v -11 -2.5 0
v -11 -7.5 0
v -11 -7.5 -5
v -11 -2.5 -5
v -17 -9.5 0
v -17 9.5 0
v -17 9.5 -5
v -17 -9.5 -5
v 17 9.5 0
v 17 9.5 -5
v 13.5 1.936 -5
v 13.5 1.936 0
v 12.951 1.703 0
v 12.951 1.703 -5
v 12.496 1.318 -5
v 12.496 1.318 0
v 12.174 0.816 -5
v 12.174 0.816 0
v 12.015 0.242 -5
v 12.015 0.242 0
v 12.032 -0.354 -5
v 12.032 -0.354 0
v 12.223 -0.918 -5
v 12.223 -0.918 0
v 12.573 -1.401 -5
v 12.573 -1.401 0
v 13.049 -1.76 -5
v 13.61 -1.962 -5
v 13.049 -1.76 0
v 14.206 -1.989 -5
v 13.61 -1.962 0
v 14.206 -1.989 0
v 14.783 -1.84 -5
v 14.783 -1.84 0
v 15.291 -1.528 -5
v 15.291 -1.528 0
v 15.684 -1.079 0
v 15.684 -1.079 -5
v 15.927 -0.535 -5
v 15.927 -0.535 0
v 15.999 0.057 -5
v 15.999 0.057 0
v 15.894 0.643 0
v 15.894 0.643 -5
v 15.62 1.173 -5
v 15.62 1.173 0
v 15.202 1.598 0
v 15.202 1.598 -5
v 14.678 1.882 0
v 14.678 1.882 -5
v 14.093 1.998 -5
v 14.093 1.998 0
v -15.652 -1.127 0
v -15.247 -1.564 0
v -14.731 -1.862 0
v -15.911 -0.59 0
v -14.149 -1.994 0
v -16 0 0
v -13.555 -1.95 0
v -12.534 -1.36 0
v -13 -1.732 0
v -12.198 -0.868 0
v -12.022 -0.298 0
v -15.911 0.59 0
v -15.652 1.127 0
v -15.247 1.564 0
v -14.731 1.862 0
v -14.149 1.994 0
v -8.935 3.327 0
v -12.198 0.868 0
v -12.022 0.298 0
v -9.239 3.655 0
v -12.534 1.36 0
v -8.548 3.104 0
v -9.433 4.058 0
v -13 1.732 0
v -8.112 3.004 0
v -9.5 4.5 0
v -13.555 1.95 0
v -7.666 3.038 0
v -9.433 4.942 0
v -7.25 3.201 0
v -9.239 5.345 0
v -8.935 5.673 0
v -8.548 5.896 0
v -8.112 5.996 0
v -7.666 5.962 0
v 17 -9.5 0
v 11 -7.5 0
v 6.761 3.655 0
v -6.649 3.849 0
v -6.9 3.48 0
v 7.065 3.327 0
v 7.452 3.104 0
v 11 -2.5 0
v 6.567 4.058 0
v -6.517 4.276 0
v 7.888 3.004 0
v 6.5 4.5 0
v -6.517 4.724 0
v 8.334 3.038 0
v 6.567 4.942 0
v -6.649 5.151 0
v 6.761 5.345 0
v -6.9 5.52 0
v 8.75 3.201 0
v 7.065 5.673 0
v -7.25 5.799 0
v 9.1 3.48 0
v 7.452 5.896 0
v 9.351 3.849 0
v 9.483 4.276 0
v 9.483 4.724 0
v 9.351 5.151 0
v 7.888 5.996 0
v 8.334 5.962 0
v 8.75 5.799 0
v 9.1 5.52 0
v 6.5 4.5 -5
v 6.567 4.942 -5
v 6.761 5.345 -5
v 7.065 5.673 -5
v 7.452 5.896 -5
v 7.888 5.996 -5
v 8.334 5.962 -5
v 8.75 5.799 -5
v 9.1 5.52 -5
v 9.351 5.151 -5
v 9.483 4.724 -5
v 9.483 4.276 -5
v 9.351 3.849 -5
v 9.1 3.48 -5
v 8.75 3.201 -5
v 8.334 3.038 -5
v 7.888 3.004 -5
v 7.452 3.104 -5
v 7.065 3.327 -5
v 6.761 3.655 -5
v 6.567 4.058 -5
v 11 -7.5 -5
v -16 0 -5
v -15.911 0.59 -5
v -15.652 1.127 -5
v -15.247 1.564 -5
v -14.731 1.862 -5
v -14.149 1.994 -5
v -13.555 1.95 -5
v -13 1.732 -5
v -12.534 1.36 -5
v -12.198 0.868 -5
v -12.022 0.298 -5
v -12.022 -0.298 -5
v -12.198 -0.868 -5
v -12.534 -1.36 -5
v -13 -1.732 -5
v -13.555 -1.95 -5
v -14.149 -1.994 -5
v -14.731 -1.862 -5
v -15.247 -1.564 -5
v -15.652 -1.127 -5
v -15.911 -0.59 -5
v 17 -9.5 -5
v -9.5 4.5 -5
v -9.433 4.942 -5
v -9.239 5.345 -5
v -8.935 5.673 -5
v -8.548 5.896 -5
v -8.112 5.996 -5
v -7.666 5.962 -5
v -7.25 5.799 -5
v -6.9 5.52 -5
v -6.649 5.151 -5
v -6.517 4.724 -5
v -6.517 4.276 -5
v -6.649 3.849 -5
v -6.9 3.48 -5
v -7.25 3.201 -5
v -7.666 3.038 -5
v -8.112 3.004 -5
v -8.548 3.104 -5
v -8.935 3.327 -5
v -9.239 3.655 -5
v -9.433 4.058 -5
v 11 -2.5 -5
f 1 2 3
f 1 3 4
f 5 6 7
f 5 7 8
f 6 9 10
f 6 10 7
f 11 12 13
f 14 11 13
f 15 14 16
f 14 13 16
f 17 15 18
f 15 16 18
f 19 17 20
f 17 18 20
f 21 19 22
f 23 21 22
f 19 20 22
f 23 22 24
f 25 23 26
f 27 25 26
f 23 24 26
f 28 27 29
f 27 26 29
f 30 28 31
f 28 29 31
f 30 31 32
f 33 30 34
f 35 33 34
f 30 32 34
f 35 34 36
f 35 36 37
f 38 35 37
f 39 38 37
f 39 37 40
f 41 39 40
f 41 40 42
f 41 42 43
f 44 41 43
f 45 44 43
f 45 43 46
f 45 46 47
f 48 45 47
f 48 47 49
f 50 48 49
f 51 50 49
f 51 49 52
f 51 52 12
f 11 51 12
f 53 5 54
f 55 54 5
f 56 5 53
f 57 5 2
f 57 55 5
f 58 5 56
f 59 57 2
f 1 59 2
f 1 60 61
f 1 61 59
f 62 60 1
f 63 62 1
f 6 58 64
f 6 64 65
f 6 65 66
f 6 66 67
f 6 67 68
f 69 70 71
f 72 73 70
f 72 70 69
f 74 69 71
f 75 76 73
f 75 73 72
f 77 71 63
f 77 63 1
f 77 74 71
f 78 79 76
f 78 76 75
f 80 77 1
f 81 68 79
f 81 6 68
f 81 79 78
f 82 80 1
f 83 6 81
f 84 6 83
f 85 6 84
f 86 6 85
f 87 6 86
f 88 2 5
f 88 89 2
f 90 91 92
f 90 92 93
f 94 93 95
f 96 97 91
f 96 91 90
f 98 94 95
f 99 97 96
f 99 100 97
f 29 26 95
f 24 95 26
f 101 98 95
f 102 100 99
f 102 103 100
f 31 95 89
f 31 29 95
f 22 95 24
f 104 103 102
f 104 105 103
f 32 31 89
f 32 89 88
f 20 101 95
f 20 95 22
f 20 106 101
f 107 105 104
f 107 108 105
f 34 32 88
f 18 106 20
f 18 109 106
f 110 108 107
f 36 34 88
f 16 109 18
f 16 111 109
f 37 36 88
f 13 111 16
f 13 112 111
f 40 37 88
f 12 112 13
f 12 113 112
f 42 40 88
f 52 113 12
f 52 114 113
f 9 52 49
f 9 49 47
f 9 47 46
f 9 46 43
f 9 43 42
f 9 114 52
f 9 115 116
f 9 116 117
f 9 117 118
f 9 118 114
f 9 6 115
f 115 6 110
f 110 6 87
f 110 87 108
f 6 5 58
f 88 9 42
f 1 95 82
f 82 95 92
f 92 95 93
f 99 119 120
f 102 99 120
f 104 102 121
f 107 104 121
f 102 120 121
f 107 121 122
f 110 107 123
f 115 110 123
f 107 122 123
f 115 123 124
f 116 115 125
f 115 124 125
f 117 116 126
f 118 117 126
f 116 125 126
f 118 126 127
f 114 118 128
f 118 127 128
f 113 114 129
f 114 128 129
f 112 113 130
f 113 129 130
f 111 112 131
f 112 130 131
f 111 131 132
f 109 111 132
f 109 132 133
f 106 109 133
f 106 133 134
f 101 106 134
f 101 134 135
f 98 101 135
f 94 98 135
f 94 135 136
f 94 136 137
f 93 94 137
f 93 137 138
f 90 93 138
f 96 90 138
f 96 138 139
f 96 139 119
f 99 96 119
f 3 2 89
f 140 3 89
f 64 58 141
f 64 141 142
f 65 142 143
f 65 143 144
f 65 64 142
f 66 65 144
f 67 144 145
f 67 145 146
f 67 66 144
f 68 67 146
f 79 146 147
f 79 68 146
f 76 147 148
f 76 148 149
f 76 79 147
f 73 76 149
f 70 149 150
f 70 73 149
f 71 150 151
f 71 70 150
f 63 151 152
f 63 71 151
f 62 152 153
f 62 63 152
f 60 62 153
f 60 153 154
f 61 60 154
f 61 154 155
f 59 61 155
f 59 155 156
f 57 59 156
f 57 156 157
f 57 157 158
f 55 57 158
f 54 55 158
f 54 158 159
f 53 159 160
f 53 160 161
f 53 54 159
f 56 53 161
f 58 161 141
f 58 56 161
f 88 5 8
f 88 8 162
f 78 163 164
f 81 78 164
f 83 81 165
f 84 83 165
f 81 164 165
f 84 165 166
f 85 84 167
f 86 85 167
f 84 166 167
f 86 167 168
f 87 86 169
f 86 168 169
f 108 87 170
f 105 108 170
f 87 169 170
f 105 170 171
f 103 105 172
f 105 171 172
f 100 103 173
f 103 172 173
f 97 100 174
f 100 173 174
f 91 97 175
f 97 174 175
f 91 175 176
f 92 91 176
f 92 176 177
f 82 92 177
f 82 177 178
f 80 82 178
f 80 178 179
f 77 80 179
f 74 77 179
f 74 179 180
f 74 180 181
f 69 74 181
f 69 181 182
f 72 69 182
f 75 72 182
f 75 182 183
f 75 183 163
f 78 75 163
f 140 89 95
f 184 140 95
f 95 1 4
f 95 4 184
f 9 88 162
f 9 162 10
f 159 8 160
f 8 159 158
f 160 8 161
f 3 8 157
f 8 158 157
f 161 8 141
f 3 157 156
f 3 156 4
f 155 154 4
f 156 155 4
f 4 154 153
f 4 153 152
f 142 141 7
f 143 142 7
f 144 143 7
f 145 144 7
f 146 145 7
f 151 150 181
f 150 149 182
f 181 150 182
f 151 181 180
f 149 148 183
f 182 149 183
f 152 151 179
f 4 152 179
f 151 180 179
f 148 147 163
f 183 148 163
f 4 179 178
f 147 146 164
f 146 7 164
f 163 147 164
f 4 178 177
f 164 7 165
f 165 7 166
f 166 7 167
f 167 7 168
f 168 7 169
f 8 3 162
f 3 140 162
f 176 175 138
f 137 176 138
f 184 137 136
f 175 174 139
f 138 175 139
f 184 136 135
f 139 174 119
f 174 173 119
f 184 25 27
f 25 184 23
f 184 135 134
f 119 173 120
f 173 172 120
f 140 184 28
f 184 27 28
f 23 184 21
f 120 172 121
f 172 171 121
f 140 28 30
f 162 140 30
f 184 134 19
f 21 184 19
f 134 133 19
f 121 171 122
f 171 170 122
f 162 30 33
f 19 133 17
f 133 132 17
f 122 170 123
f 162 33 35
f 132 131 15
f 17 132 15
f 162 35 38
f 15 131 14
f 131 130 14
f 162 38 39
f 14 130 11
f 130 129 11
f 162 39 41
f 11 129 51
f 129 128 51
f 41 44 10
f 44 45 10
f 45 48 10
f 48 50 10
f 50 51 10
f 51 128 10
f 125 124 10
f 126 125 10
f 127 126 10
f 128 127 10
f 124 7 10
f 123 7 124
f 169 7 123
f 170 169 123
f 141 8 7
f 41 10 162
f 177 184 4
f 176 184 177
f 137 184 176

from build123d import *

# Parameters (mm, degrees)
F0_W     = 22
F0_H     = 5
F0_R     = 2
F1_DEPTH = 5
F3_D     = 4
F4_DEPTH = 5
F6_D     = 3


with BuildPart() as f1:
    # F0 (on Top) → F1 (new body)
    with BuildSketch(Plane.XY):
        Polygon((17, 0), (17, 9.5), (-17, 9.5), (-17, 0), (-17, -7.5), (-17, -9.5), (-11, -9.5), (14, -9.5), (17, -9.5), (17, -7.5), align=None)
        with Locations((0, -5)):
            Rectangle(F0_W, F0_H, mode=Mode.SUBTRACT)
        with BuildLine():
            ThreePointArc((-12, 0), (-14, -2), (-16, 0))
            ThreePointArc((-16, 0), (-14, 2), (-12, 0))
        make_face(mode=Mode.SUBTRACT)
        with Locations((14, 0)):
            Circle(F0_R, mode=Mode.SUBTRACT)
    extrude(amount=-F1_DEPTH)

    # F3 (through all)
    with Locations(Plane.XY):
        with Locations((13, 0)):
            Hole(F3_D / 2)

    # F0 (on Top) → F4 (join)
    with BuildSketch(Plane.XY):
        with BuildLine():
            ThreePointArc((-12, 0), (-14, 2), (-16, 0))
            ThreePointArc((-16, 0), (-14, -2), (-12, 0))
        make_face()
        with Locations((14, 0)):
            Circle(F0_R)
        Polygon((17, 0), (17, 9.5), (-17, 9.5), (-17, 0), (-17, -7.5), (-17, -9.5), (-11, -9.5), (14, -9.5), (17, -9.5), (17, -7.5), align=None)
        with Locations((0, -5)):
            Rectangle(F0_W, F0_H, mode=Mode.SUBTRACT)
        with BuildLine():
            ThreePointArc((-12, 0), (-14, -2), (-16, 0))
            ThreePointArc((-16, 0), (-14, 2), (-12, 0))
        make_face(mode=Mode.SUBTRACT)
        with Locations((14, 0)):
            Circle(F0_R, mode=Mode.SUBTRACT)
    extrude(amount=-F4_DEPTH)

    # F6 (through all)
    with Locations(Plane.XY):
        with Locations((-8, 4.5), (8, 4.5)):
            Hole(F6_D / 2)


solid = f1.part
